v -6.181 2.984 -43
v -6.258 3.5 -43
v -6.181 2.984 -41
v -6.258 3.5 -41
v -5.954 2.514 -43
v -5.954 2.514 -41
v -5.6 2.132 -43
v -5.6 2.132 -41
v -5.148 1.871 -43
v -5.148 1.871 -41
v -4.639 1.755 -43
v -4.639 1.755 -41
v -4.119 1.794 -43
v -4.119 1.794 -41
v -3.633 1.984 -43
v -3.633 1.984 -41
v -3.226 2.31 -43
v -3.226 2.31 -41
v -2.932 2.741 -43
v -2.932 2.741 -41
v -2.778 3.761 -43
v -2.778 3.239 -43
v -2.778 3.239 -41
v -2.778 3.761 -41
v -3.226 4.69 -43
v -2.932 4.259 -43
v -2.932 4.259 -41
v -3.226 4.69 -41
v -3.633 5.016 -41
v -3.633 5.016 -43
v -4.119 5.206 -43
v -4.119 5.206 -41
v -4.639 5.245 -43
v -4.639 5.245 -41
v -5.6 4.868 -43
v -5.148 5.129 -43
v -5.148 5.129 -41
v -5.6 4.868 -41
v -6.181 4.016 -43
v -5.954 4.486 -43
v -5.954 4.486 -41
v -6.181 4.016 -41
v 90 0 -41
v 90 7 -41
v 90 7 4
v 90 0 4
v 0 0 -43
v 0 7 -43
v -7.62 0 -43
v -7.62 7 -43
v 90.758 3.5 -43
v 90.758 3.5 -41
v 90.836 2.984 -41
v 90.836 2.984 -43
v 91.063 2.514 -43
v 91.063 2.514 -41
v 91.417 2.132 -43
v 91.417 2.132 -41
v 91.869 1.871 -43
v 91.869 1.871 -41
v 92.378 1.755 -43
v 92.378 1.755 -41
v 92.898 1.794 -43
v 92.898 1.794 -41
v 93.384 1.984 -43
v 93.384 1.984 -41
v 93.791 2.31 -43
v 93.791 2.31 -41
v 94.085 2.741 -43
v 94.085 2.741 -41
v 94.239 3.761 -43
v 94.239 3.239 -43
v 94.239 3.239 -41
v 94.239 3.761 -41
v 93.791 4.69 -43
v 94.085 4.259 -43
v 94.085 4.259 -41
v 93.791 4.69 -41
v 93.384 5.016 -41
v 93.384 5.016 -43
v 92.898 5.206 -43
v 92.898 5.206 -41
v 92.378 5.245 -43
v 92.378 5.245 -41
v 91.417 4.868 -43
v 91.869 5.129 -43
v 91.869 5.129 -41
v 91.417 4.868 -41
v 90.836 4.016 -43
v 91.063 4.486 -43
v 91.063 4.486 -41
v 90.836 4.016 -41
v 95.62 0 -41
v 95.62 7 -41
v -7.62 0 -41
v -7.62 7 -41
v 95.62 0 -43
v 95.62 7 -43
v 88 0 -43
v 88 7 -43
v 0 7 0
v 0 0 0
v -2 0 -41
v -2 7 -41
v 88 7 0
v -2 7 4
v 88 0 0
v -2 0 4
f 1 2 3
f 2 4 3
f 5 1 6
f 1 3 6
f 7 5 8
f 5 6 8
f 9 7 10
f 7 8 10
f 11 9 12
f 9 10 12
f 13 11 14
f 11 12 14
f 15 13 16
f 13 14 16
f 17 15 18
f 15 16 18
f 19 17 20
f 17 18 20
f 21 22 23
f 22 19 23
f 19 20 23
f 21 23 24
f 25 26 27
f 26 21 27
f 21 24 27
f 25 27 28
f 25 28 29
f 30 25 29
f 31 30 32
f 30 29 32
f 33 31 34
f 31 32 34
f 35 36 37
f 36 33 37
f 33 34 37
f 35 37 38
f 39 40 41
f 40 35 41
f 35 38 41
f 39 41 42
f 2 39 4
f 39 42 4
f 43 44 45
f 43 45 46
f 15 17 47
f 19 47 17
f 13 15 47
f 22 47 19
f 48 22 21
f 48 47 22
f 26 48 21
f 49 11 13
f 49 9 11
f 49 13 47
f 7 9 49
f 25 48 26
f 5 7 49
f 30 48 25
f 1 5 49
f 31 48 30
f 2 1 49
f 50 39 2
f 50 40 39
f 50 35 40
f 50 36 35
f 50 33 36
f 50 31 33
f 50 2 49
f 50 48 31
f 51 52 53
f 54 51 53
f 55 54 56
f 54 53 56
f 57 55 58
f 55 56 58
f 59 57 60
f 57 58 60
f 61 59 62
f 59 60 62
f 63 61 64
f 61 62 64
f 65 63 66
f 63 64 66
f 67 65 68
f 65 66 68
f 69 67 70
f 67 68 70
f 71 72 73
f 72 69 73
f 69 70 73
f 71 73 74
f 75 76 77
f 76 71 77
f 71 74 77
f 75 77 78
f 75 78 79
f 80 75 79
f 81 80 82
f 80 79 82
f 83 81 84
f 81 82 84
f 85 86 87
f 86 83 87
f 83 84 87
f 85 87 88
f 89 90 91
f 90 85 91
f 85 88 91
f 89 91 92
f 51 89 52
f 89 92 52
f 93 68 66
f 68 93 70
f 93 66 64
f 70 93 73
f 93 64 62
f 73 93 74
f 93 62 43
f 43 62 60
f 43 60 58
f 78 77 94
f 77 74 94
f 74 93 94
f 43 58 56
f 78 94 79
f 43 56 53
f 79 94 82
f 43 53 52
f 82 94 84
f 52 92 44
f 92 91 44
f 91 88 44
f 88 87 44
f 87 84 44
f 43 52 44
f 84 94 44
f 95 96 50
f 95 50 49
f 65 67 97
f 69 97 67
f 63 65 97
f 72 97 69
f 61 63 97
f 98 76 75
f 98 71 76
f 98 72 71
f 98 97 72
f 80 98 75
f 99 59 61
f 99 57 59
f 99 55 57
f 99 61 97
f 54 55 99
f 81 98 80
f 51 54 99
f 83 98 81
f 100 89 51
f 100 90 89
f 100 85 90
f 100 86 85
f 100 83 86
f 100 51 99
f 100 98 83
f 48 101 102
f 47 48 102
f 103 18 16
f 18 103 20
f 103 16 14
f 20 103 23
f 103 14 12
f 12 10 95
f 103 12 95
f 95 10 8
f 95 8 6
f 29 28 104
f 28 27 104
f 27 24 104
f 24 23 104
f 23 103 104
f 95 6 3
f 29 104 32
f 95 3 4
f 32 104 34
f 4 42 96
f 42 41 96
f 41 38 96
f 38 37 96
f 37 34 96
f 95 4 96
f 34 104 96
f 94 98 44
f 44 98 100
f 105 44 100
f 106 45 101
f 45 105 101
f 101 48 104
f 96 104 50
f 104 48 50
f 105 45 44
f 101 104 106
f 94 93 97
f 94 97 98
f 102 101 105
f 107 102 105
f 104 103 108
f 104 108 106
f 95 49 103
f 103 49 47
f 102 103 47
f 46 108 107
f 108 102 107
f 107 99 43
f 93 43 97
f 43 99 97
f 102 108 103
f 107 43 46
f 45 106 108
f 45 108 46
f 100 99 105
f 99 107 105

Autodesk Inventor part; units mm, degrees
ref_plane "YZ Plane" through (0, 0, 0) normal (1, 0, 0) x (0, 1, 0)
ref_plane "XZ Plane" through (0, 0, 0) normal (0, 1, 0) x (-1, 0, 0)
ref_plane "XY Plane" through (0, 0, 0) normal (0, 0, 1) x (1, 0, 0)
sketch "Sketch1" plane through (0, 0, 0) normal (0, 0, 1) x (1, 0, 0)
  line L0 (0, 0) -> (88, 0)
  line L1 (88, 0) -> (88, 7)
  line L2 (88, 7) -> (0, 7)
  line L3 (0, 7) -> (0, 0)
  dimension "d0" = 88
  dimension "d1" = 7
extrude "Extrusion1" add sketch "Sketch1" along normal blind 4
sketch "Sketch2" plane through (0, 0, 0) normal (0, 0, -1) x (-1, 0, 0)
  line L0 (0, 0) -> (-88, 0) projected
  line L1 (0, 7) -> (0, 0) projected
  line L2 (-88, 7) -> (0, 7) projected
  line L3 (-88, 0) -> (-88, 7) projected
  line L4 (0, 0) -> (2, 0)
  line L5 (2, 0) -> (2, 7)
  line L6 (2, 7) -> (0, 7)
  line L7 (0, 7) -> (0, 0)
  line L8 (-88, 7) -> (-90, 7)
  line L9 (-90, 7) -> (-90, 0)
  line L10 (-90, 0) -> (-88, 0)
  line L11 (-88, 0) -> (-88, 7)
  dimension "d4" = 2
  dimension "d5" = 2
extrude "Extrusion2" add sketch "Sketch2" along normal blind 41 contours L1 L6 L5 L4 | L10 L9 L8 L3
extrude "Extrusion3" add sketch "Sketch2" against normal blind 4 contours L1 L6 L5 L4 | L10 L9 L8 L3
sketch "Sketch3" plane through (0, 0, -41) normal (0, 0, -1) x (-1, 0, 0)
  line L0 (-88, 7) -> (-90, 7) projected
  line L1 (-90, 7) -> (-90, 0) projected
  line L2 (-90, 0) -> (-88, 0) projected
  line L3 (-88, 0) -> (-88, 7) projected
  line L4 (2, 0) -> (2, 7) projected
  line L5 (0, 0) -> (2, 0) projected
  line L6 (2, 0) -> (2, 7) projected
  line L7 (2, 7) -> (0, 7) projected
  line L8 (0, 7) -> (0, 0) projected
  line L9 (-88, 0) -> (-95.62, 0)
  line L10 (-95.62, 0) -> (-95.62, 7)
  line L11 (-95.62, 7) -> (-88, 7)
  line L12 (-88, 7) -> (-88, 0)
  circle A0 centre (-92.5085, 3.5) radius 1.75
  line L13 (0, 7) -> (7.62, 7)
  line L14 (7.62, 7) -> (7.62, 0)
  line L15 (7.62, 0) -> (0, 0)
  line L16 (0, 0) -> (0, 7)
  circle A1 centre (4.5085, 3.5) radius 1.75
  dimension "d10" = 3.5
  dimension "d12" = 3.5
  dimension "d17" = 7.62
  dimension "d18" = 7.62
  dimension "d21" = 97.017
extrude "Extrusion4" add sketch "Sketch3" along normal blind 2
